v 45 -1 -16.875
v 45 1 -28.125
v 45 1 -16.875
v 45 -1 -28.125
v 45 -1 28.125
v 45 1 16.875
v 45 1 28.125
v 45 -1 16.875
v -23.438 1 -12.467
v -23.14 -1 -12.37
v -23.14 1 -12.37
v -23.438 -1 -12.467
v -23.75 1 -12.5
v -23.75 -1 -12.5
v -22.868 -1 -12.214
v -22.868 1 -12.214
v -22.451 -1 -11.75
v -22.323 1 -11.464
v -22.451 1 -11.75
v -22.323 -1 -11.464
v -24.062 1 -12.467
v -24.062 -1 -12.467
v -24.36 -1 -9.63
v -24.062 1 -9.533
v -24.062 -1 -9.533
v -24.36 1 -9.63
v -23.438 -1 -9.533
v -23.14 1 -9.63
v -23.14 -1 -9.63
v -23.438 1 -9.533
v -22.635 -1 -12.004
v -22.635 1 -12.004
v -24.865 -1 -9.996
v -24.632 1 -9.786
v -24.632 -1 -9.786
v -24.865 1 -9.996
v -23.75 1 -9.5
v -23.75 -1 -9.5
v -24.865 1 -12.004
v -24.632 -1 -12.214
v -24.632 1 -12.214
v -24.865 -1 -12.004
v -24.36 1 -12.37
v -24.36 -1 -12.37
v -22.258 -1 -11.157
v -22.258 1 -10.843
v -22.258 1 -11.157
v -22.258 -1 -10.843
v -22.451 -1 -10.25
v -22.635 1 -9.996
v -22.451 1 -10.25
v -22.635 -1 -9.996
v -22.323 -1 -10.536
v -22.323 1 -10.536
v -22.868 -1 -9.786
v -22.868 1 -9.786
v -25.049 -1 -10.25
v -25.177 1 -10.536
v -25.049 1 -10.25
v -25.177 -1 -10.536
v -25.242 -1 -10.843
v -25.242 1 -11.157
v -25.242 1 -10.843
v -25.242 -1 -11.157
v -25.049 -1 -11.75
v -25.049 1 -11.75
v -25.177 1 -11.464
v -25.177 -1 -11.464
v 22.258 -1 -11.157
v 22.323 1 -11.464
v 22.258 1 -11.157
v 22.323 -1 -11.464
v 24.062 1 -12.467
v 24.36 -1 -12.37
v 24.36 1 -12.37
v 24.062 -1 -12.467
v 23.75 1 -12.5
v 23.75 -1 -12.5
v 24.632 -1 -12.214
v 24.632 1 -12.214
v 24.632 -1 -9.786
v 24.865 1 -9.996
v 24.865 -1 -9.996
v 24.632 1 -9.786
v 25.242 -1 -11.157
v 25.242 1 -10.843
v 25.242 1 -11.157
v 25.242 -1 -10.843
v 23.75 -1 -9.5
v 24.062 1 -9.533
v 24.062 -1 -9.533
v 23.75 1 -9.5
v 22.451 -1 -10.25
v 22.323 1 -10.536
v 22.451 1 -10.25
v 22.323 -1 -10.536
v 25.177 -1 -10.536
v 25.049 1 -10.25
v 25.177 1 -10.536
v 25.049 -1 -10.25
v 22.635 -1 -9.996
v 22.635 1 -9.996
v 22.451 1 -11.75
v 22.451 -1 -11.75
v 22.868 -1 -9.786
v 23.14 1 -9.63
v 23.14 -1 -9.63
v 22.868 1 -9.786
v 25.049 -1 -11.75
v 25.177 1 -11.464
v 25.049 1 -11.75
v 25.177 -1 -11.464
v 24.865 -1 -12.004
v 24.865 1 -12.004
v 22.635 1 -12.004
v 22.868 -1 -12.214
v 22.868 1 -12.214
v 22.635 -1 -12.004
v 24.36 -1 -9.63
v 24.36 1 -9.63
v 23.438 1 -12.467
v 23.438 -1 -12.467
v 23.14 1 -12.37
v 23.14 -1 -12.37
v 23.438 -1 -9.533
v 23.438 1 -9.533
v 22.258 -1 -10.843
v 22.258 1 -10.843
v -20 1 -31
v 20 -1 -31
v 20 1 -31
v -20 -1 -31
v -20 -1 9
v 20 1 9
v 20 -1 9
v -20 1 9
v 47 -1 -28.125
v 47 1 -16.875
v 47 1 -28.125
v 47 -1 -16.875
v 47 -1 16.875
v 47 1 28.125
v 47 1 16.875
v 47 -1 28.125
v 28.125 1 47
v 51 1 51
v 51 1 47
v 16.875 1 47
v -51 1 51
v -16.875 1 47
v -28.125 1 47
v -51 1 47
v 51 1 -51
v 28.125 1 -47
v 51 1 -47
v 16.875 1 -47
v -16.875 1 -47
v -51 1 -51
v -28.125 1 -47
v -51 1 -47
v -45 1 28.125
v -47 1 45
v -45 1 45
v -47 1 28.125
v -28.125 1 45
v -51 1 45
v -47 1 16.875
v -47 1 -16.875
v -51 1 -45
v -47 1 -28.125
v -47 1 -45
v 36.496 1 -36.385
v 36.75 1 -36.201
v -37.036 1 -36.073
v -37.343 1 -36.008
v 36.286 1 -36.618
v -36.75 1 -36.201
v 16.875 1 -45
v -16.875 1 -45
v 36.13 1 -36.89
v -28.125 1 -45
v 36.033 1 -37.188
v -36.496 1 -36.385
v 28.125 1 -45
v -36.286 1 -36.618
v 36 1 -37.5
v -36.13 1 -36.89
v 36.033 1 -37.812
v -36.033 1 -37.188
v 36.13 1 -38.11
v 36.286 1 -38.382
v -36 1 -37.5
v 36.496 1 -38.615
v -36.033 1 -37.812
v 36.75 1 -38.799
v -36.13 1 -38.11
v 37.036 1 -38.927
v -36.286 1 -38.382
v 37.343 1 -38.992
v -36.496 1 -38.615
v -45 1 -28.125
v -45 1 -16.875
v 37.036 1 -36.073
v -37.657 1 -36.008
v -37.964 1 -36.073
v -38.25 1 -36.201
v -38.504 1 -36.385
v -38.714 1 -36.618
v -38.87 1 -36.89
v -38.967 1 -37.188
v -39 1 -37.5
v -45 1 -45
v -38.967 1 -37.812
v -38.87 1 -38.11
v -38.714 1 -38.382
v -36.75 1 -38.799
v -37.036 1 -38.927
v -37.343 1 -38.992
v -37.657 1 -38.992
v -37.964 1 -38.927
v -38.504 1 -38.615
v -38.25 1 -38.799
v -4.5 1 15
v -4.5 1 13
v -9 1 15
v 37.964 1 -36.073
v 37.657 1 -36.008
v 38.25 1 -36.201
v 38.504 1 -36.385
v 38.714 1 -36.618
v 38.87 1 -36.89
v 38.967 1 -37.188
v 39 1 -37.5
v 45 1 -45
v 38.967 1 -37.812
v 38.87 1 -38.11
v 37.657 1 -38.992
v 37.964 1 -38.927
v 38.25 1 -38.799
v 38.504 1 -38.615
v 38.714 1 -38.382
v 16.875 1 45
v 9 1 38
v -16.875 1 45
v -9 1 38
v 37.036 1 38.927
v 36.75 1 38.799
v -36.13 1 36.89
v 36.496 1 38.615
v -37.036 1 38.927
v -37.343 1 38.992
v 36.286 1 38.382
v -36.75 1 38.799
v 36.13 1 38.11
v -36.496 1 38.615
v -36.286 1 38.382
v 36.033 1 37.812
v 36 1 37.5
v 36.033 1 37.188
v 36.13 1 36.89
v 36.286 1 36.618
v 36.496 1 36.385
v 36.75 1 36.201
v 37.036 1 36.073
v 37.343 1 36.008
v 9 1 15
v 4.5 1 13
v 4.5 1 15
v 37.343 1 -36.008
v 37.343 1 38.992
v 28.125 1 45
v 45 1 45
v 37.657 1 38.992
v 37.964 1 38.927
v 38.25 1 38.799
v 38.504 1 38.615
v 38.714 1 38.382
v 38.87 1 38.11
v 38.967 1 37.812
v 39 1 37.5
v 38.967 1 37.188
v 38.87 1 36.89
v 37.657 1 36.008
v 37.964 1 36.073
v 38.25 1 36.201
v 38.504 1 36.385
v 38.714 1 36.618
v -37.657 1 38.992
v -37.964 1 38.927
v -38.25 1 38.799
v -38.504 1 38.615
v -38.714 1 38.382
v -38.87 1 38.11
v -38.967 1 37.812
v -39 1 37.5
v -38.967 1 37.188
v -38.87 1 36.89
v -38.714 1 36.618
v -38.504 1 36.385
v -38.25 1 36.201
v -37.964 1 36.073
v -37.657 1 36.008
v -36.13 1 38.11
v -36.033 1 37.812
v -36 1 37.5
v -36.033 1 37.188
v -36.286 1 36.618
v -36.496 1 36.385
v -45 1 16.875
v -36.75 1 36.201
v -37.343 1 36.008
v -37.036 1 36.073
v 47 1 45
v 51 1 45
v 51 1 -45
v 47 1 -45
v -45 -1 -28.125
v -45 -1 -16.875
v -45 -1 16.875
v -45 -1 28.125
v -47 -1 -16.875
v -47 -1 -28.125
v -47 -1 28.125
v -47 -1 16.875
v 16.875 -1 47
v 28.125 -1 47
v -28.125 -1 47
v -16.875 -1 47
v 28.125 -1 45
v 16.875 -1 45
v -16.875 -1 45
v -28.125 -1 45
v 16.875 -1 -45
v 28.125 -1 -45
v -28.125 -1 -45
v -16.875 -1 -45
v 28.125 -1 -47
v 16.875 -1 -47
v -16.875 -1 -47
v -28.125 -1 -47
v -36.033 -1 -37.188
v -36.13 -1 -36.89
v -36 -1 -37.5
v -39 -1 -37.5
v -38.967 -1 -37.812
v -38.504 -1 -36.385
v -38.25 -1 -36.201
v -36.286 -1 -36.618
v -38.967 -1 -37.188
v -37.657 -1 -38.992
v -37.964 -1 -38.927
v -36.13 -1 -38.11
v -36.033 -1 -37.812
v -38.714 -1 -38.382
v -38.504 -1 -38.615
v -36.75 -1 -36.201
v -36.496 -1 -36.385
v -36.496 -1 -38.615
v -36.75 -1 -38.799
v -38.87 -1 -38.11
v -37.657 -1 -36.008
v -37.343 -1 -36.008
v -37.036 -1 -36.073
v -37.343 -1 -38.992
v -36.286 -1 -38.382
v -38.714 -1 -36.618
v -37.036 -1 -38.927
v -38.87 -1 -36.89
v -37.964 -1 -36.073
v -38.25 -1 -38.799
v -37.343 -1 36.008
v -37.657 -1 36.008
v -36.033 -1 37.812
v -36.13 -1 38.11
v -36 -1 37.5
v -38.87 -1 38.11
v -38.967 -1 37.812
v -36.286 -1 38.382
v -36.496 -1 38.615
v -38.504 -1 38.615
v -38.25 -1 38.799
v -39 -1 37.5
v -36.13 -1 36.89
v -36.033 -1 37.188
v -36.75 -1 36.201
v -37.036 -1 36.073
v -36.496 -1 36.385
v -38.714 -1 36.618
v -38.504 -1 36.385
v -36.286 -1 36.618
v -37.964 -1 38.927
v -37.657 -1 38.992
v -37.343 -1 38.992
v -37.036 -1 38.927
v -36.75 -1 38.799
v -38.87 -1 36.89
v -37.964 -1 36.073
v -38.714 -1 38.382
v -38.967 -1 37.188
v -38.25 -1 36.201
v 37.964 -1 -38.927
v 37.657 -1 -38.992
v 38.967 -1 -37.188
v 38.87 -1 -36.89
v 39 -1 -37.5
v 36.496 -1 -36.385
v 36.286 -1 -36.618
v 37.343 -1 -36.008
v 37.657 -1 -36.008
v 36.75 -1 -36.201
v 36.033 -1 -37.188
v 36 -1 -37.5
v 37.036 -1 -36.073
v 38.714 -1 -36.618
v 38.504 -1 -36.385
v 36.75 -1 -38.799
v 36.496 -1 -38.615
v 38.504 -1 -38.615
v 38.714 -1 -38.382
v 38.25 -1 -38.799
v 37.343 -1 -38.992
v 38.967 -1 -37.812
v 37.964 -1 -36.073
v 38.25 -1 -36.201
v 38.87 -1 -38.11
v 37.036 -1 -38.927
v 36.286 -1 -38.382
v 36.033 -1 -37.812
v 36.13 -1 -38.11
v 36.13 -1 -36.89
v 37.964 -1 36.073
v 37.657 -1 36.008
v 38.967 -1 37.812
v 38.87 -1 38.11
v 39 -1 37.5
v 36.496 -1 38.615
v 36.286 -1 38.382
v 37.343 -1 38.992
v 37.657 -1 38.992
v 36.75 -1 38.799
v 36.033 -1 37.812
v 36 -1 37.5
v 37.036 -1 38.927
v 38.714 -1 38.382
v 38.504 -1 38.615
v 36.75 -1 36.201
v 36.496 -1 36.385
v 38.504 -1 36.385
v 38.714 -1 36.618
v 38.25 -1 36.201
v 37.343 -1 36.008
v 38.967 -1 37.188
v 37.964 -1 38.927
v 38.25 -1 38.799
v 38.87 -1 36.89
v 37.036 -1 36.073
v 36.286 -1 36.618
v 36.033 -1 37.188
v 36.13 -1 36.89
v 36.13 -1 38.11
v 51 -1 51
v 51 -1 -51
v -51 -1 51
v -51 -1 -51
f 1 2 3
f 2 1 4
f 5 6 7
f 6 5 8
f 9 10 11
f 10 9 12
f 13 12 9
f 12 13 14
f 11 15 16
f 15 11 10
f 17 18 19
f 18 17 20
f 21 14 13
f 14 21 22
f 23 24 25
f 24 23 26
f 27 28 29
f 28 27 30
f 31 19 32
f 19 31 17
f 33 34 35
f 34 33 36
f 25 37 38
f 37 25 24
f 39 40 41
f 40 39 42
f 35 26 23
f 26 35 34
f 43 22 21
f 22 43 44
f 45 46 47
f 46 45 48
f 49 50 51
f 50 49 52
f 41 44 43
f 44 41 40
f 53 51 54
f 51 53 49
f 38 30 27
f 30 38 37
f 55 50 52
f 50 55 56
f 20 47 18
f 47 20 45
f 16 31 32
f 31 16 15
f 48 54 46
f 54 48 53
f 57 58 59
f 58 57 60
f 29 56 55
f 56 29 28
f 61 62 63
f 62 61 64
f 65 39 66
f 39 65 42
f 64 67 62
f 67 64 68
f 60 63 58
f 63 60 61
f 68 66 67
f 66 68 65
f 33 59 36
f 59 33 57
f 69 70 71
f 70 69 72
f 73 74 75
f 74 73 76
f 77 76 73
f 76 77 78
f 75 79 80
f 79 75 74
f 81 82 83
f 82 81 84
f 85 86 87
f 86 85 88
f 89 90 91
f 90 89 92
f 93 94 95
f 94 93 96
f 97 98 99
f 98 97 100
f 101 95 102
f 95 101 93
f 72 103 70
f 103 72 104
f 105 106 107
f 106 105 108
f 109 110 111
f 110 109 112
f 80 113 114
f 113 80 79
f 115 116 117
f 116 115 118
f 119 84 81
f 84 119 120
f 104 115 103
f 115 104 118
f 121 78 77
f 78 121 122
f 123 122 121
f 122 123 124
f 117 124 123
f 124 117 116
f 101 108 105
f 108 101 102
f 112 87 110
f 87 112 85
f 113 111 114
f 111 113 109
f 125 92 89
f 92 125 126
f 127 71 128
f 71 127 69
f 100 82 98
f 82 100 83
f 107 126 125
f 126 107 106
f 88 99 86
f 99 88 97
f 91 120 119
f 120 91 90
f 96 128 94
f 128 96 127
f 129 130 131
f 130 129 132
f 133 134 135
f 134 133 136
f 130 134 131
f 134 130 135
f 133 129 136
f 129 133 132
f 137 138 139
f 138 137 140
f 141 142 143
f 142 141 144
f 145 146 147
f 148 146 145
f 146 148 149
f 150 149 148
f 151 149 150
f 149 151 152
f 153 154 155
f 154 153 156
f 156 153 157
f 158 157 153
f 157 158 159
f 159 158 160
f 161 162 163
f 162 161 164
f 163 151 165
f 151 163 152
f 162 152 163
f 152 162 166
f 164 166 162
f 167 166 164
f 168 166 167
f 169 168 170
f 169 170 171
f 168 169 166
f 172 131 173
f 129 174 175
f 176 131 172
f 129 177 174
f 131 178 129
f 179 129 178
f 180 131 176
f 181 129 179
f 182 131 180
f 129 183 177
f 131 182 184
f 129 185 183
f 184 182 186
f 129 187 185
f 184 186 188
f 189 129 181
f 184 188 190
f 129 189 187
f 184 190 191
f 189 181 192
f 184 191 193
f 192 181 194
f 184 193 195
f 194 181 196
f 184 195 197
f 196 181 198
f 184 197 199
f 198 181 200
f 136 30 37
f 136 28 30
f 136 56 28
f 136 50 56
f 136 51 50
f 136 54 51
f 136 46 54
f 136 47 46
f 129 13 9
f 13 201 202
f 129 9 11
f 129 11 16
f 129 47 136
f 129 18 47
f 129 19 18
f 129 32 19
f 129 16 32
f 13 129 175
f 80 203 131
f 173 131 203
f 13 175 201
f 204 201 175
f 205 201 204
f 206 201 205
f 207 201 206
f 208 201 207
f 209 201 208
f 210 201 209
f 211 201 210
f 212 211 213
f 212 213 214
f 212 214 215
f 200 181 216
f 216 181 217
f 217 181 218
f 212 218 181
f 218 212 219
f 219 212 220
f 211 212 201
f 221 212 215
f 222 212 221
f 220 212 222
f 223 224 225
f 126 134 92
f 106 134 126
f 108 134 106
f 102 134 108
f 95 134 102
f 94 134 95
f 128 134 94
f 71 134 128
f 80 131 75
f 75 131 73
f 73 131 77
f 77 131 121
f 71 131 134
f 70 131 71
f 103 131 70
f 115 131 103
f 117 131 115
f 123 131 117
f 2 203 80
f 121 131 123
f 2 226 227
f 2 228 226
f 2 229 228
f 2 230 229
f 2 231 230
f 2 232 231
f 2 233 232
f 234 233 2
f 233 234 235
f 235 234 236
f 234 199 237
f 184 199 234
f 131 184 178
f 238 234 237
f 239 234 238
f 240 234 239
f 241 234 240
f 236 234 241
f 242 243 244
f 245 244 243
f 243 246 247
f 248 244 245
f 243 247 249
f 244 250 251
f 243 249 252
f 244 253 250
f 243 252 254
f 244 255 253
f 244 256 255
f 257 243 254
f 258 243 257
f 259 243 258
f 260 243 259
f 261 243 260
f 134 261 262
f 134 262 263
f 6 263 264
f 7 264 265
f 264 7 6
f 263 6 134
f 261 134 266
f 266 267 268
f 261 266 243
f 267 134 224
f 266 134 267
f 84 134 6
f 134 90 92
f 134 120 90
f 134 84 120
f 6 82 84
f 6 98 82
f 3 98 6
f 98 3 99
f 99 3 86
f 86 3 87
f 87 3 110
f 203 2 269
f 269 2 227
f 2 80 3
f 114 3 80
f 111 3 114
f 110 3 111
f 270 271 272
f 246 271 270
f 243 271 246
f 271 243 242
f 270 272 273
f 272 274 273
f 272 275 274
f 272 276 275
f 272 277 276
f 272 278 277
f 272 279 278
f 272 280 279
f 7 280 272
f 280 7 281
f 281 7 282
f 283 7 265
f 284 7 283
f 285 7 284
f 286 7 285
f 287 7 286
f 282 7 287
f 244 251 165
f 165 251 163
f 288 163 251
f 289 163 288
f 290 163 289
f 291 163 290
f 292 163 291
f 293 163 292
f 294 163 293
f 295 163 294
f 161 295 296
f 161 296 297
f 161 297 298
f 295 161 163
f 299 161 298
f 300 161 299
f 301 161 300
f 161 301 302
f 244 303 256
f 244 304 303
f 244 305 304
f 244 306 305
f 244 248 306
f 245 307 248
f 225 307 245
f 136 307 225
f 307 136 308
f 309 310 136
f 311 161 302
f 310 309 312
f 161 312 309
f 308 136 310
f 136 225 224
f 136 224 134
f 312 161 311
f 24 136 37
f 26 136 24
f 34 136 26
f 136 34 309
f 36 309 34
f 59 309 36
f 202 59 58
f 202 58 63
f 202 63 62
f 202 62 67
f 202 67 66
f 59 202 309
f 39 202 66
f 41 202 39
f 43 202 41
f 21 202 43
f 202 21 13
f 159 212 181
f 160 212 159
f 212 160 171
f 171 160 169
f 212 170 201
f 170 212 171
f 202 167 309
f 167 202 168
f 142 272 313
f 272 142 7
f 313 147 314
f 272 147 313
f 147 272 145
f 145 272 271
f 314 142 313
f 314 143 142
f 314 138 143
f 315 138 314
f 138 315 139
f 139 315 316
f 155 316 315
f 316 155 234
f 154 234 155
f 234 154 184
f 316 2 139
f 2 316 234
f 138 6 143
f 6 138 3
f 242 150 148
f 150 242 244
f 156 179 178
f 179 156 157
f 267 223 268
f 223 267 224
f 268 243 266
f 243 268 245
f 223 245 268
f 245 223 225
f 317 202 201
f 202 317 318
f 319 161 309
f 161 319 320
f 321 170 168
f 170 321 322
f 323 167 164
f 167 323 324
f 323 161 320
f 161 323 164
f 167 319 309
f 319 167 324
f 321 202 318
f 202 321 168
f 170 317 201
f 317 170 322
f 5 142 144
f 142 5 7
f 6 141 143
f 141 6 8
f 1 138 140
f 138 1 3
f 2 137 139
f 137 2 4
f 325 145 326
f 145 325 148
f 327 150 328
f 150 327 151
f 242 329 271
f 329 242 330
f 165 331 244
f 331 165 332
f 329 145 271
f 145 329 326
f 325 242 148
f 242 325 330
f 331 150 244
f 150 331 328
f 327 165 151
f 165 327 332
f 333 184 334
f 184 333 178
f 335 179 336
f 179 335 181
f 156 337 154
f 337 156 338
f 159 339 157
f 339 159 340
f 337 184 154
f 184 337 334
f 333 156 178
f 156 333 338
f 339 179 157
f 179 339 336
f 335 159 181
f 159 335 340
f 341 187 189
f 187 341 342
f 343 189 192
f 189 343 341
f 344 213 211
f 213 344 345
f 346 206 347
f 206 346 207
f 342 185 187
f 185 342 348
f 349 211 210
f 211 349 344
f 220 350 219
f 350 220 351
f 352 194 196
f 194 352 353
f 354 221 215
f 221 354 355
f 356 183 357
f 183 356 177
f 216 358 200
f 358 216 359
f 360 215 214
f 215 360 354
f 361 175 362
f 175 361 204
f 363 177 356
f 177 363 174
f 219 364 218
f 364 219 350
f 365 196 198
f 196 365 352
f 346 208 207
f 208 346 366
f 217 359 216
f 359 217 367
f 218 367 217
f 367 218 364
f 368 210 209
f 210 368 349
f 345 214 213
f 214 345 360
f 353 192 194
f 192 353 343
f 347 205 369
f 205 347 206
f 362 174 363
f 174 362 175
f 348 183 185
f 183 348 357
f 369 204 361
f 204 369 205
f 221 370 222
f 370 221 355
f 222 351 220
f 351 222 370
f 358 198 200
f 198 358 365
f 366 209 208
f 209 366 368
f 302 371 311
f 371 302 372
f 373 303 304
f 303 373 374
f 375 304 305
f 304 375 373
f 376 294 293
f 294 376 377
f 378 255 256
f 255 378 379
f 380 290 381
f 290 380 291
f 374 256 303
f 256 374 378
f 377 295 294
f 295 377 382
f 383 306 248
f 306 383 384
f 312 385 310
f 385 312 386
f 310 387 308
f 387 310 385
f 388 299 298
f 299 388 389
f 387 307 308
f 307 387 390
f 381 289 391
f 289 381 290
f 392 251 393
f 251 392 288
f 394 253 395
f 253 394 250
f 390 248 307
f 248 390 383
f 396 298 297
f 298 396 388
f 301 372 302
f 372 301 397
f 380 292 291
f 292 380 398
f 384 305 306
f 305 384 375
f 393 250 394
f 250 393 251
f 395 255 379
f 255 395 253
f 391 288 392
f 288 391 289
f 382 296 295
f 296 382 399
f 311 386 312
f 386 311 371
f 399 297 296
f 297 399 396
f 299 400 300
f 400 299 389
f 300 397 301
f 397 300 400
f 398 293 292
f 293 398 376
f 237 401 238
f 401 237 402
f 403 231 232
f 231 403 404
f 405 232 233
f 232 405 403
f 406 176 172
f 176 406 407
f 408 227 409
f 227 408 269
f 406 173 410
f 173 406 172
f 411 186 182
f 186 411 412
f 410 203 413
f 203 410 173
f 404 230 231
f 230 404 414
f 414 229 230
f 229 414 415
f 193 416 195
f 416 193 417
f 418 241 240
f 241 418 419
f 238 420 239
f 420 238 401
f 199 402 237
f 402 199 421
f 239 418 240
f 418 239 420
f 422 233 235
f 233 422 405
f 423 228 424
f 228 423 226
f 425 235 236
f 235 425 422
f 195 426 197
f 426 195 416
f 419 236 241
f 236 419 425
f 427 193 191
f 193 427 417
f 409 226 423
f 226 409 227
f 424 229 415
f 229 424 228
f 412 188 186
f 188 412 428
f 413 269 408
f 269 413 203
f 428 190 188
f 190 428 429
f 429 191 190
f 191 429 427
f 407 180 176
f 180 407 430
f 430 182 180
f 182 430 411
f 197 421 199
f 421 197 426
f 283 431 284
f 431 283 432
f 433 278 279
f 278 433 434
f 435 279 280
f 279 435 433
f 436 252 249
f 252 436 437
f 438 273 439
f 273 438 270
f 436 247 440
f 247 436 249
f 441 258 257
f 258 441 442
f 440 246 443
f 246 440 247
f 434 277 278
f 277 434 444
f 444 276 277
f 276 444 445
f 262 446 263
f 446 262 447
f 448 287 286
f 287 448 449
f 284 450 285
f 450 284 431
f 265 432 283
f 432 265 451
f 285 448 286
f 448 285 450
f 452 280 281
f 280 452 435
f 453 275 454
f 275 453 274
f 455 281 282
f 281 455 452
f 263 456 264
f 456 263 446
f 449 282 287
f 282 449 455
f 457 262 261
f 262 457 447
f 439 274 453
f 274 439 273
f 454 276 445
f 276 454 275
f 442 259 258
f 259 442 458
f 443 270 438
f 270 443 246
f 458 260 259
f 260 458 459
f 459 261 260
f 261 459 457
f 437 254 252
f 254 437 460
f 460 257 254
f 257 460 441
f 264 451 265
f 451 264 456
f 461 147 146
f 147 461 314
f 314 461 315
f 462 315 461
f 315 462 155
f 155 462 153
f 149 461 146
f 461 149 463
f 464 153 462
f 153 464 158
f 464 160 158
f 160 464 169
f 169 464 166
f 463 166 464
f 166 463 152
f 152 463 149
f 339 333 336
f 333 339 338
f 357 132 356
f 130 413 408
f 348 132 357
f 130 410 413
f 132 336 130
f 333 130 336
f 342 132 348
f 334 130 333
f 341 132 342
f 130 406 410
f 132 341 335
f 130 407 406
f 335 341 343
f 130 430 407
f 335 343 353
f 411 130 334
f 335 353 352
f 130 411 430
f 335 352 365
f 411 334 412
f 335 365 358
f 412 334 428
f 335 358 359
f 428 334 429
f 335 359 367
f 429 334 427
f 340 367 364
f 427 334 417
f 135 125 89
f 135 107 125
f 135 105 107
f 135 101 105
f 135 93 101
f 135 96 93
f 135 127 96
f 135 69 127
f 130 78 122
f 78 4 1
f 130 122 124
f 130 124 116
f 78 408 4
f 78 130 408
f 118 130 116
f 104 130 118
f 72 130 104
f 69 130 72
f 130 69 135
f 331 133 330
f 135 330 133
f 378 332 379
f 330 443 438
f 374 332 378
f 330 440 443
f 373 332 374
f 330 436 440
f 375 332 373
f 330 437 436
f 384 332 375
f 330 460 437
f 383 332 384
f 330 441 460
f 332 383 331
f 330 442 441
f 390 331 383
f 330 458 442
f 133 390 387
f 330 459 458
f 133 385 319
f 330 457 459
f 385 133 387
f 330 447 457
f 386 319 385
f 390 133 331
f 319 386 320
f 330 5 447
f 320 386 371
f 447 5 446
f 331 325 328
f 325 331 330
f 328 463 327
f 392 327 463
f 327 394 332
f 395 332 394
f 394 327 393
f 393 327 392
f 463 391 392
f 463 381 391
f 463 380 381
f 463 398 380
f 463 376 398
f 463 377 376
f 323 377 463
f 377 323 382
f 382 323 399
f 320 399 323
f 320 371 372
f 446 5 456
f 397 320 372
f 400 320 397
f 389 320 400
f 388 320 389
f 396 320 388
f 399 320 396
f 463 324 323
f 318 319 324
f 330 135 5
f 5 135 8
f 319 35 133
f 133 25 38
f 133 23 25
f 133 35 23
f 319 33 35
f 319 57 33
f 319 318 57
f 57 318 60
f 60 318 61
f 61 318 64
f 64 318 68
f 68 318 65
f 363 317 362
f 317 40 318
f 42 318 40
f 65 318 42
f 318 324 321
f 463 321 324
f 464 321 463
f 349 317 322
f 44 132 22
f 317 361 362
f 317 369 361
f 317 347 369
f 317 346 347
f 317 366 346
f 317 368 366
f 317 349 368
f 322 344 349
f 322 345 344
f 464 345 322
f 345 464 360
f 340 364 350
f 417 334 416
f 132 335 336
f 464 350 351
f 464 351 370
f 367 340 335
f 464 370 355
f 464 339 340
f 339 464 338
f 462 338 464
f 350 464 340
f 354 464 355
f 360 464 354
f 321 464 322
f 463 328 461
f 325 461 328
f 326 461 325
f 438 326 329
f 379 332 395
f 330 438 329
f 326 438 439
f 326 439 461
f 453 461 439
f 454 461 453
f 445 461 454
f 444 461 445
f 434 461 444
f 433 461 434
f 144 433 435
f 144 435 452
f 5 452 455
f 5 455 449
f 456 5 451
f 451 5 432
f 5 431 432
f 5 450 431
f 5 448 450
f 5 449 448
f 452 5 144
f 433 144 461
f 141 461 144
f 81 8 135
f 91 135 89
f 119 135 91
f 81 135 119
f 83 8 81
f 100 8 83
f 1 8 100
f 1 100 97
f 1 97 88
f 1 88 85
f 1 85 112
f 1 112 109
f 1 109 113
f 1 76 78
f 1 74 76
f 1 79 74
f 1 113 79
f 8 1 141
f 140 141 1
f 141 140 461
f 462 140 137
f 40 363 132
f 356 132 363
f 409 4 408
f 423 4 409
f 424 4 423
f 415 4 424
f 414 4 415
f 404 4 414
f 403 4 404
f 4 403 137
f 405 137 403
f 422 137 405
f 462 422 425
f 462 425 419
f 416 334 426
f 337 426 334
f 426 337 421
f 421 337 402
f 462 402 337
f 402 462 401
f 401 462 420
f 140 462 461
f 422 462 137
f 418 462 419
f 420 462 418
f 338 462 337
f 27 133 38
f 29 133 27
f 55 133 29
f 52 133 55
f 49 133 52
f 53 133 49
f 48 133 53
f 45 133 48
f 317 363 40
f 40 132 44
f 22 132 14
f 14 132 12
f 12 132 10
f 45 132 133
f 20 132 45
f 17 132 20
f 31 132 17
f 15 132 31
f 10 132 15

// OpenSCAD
// file: boxit.scad
/** Generic snap-together enclosure creator */

I_WALL_LEFT = 0;
I_WALL_RIGHT = 1;
I_WALL_BOTTOM = 2;
I_WALL_TOP = 3;
I_WALL_BACK = 4;
I_WALL_FRONT = 5;

WALL_TH = 2;

HOLE_OR = 3 / 2;

/*
wall_th - wall thickness
inside_dims - [length, width, height]
*/
module boxit(inside_dims, wall_th=WALL_TH, ofscale=1.0) {
    ofs = boxit_wall_offsets(inside_dims, wall_th);
    
    translate(ofs[I_WALL_LEFT] * ofscale) 
        boxit_wall_left(inside_dims, wall_th) {
            children(0);
            children(1);
        }
    translate(ofs[I_WALL_RIGHT] * ofscale) 
        boxit_wall_right(inside_dims, wall_th) {
            children(0);
            children(1);
        }
    translate(ofs[I_WALL_BOTTOM] * ofscale) 
        boxit_wall_bottom(inside_dims, wall_th) {
            children(0);
            children(1);
        }
    translate(ofs[I_WALL_TOP] * ofscale) 
        boxit_wall_top(inside_dims, wall_th) {
            children(0);
            children(1);
        }
    translate(ofs[I_WALL_BACK] * ofscale) 
        boxit_wall_back(inside_dims, wall_th) {
            children(0);
            children(1);
        }
    translate(ofs[I_WALL_FRONT] * ofscale) 
        boxit_wall_front(inside_dims, wall_th) {
            children(0);
            children(1);
        }
}
    
module boxit_wall_left(inside_dims, wall_th) {
    boxit_wall(inside_dims, wall_th, I_WALL_LEFT) {
        //intersection() {
            children(0);
        //    rotate([0, -90, 0])
         //       wall_mask(inside_dims[2], inside_dims[1], inside_dims[0]/2);
         //   }
        children(1);
    }
}

module boxit_wall_right(inside_dims, wall_th) {       
    boxit_wall(inside_dims, wall_th, I_WALL_RIGHT) {
        //intersection() {
            children(0);
        //    rotate([0, 90, 0])
        //        wall_mask(inside_dims[2], inside_dims[1], inside_dims[0]/2);
        //}
        children(1);
    }
}

module boxit_wall_bottom(inside_dims, wall_th) {        
    boxit_base(inside_dims, wall_th, I_WALL_BOTTOM) {
         //   intersection() {
                children(0);
        //        rotate([0, 180, 0])
        //            wall_mask(inside_dims[0], inside_dims[1], inside_dims[2]/2);
         //   }
            children(1);
        }
    }
    
module boxit_wall_top(inside_dims, wall_th) {        
    boxit_base(inside_dims, wall_th, I_WALL_TOP) {
        //intersection() {
            children(0);
        //    wall_mask(inside_dims[0], inside_dims[1], inside_dims[2]/2);
        //}
        children(1);
    }
}

module boxit_wall_back(inside_dims, wall_th) {        
    boxit_cap(inside_dims, wall_th, I_WALL_BACK) {
        //intersection() {
            children(0);
         //   rotate([90, 0, 0])
        //        wall_mask(inside_dims[0], inside_dims[2], inside_dims[1]/2);
        //}
        children(1);
    }
}

module boxit_wall_front(inside_dims, wall_th) {        
    boxit_cap(inside_dims, wall_th, I_WALL_FRONT) {
       //intersection() {
            children([0]);
       //     rotate([-90, 0, 0])
      //          wall_mask(inside_dims[0], inside_dims[2], inside_dims[1]/2);
      // }
       children(1);
    }
}

function boxit_wall_offsets(inside_dims, wall_th) = [
    // left, right, bottom, top, back, front
    [-inside_dims[0]/2 - wall_th/2, 0, 0],
    [inside_dims[0]/2 + wall_th/2, 0, 0],
    [0, 0, -inside_dims[2]/2 - wall_th/2],
    [0, 0, inside_dims[2]/2 + wall_th/2],
    [0, -inside_dims[1]/2 - wall_th/2, 0],
    [0, inside_dims[1]/2 + wall_th/2, 0],
];

module wall_mask(l, w, h) {
    linear_extrude(height=h*2, scale=h*2)
        square([l/h, w/h], center=true);
}

module boxit_wall(inside_dims, wall_th, offs_index) {
    ofs = boxit_wall_offsets(inside_dims, wall_th);
    difference() {
        union() {
            cube([wall_th, inside_dims[1], inside_dims[2]], center=true);
            translate([0, inside_dims[1] / 4, 0])
                cube([wall_th, inside_dims[1] / 8, inside_dims[2] + 4 * wall_th], center=true);
           translate([0, -inside_dims[1] / 4, 0])
                cube([wall_th, inside_dims[1] / 8, inside_dims[2] + 4 * wall_th], center=true);
            translate([0, 0, inside_dims[2] / 4])
                cube([wall_th, inside_dims[1] + 4 * wall_th, inside_dims[2] / 8], center=true);
            translate([0, 0, -inside_dims[2] / 4])
                cube([wall_th, inside_dims[1] + 4 * wall_th, inside_dims[2] / 8], center=true);
           translate(-1 * ofs[offs_index])
                children(0);
        }
        translate(-1 * ofs[offs_index])
            children(1);
    }
}

module boxit_base(inside_dims, wall_th, offs_index) {
    ofs = boxit_wall_offsets(inside_dims, wall_th);
    difference() {
        union() {
            cube([inside_dims[0] + 6 * wall_th, inside_dims[1], wall_th], center=true);
            
            translate([inside_dims[0] / 4, 0, 0])
                cube([inside_dims[0] / 8, inside_dims[1] + 4 * wall_th, wall_th], center=true);
            translate([-inside_dims[0] / 4, 0, 0])
                cube([inside_dims[0] / 8, inside_dims[1] + 4 * wall_th, wall_th], center=true);
       
            translate(-1 * ofs[offs_index])
                children(0);
        }
        translate(-1 * ofs[offs_index] + ofs[I_WALL_LEFT])
            boxit_wall(inside_dims, wall_th, I_WALL_LEFT) {
                cube(0); //children(0);
                cube(0); //children(1);
            }
        translate(-1 * ofs[offs_index] + ofs[I_WALL_RIGHT])
            boxit_wall(inside_dims, wall_th, I_WALL_RIGHT) {
                cube(0); //children(0);
                cube(0); //children(1);
            }
        translate(-1 * ofs[offs_index])
            children(1);
    }
}

module boxit_cap(inside_dims, wall_th, offs_index) {
    ofs = boxit_wall_offsets(inside_dims, wall_th);
    difference() {
        union() {
            translate(-1 * ofs[offs_index]) {
                children([0]);
            }
            cube([inside_dims[0] + 6 * wall_th, wall_th, inside_dims[2] + 6 * wall_th], center=true);
            
        }
        
        translate(-1 * ofs[offs_index]) {
            children(1); 
            translate(ofs[I_WALL_LEFT])
                boxit_wall(inside_dims, wall_th, I_WALL_LEFT) {
                    cube(0); //children(0);
                    cube(0);
                }
            translate(ofs[I_WALL_RIGHT])
                boxit_wall(inside_dims, wall_th, I_WALL_RIGHT) {
                    cube(0); //children(0);
                    cube(0);
                }
            translate(ofs[I_WALL_TOP])
                boxit_base(inside_dims, wall_th, I_WALL_TOP) {
                    cube(0); //children(0);
                    cube(0);
                }
            translate(ofs[I_WALL_BOTTOM])
                boxit_base(inside_dims, wall_th, I_WALL_BOTTOM) {
                    cube(0); //children(0);
                    cube(0);
                }
            
            # through_holes(inside_dims, wall_th);
        }
    }
}

module through_holes(inside_dims, wall_th) {
    for (x=[-1,1]) {
        for (z=[-1,1]) {
            translate([x * (inside_dims[0] / 2 - 3 * wall_th - HOLE_OR), 0, z * (inside_dims[2] / 2 - 3 * wall_th - HOLE_OR)]) {
                rotate([90, 0, 0]) {
                    cylinder(r=HOLE_OR, h=1.5 * inside_dims[1], center=true);
            }
            }
        }
    }
}

module boxit_demo(inside_dims, wall_th, ofscale=5.0) {
    boxit(inside_dims, wall_th) {
        children(0);
        children(1);
    }
    % boxit(inside_dims, wall_th, ofscale=ofscale) {
        children(0);
        children(1);
    }
}


module demo_contents() {
    sphere(r=45);
}

module demo_anticontents() {
    rotate([45, 45, 90])
        cube(60, center=true);
}
* demo_contents();
* demo_anticontents();
wall_th = 8 * 0.2;
inside_dims = [100, 50, 75];
boxit_demo(inside_dims, wall_th) {
     demo_contents();
    demo_anticontents();
   
} 
* boxit_wall_front(inside_dims, wall_th) {
     demo_contents();
    # demo_anticontents();
   
}
// main file
use <boxit.scad>

// CONSTANTS
$fn = 30;
wall_th = 2.0;
inside_dims = [90, 90, 90];
eparts_offset = [-10, 8, 04];

// MEASUREMENTS
ssr_w = 58;
ssr_h = 45;
ssr_d = 30;
ssr_screw_c_c = 47.5;

spool_od = 200;
spool_h = 80;
spool_id = 50;
spool_oid = 95;
spool_rim_h = 4;

filament_od = 1.75;

pidbox_h = 45;
pidbox_w = 45;
pidbox_d = 85;
pidbox_face_d = 6;
pidbox_hole_od = 3;

outlet_screw_c_c = 84;
outlet_w = 34;
outlet_h = 68;
outlet_center = 9;
outlet_screw_od = 3;
outlet_face_d = 5;
outlet_d = 18;

heater_grate_w = 220;
heater_grate_h = 43;

face_d = min(outlet_face_d, pidbox_face_d);

plug_h = (outlet_h - outlet_center) / 2;
module plug_face() {
    intersection() {
        cube([plug_h, outlet_w, outlet_face_d]);
        translate([plug_h / 2, outlet_w / 2, 0])
            cylinder(h=face_d, r=outlet_w / 2);
    }
}

module outlet() {
    translate([outlet_center / 2, -outlet_w / 2, 0])
        plug_face();
    translate([-outlet_center / 2 - plug_h, -outlet_w / 2, 0])
        plug_face();
    translate([-outlet_h/2, -outlet_w/2, -outlet_d])
        cube([outlet_h, outlet_w, outlet_d]);
    # cylinder(r=outlet_screw_od/2, h=face_d);
    # translate([outlet_screw_c_c / 2, 0, 0])
        cylinder(h=face_d, r=outlet_screw_od/2);
    # translate([-outlet_screw_c_c / 2, 0, 0])
        cylinder(h=face_d, r=outlet_screw_od/2);
}

module ssr() {
    difference() {
        translate([-ssr_h/2, -ssr_w/2])
            cube([ssr_h, ssr_w, ssr_d]);
        translate([0, -ssr_screw_c_c / 2, 0])
            cylinder(r=outlet_screw_od/2, h=ssr_d);
        translate([0, ssr_screw_c_c / 2,  0])
            cylinder(r=outlet_screw_od/2, h=ssr_d);
    }
    # translate([0, -ssr_screw_c_c / 2, ssr_d/2])
        cylinder(r=outlet_screw_od/2, h=2*ssr_d, center=true);
    # translate([0, ssr_screw_c_c / 2,  ssr_d/2])
        cylinder(r=outlet_screw_od/2, h=2*ssr_d, center=true);
    translate([-20, -20, -wall_th*2])
        cube([40, 40, wall_th*4]);
        
}

module pidbox() {
    cube([pidbox_h, pidbox_w, pidbox_d], center=true);
    translate([0, 0, pidbox_d / 2 + pidbox_face_d / 2])
        cube([pidbox_h + 5, pidbox_w + 5, pidbox_face_d], center=true); 
}

module pidbox_holes(width=pidbox_h + 20, height=pidbox_h + 20) {
    ofs_x = 2.3;
    ofs_y = 4.5;
    translate([-pidbox_h / 2, -pidbox_w / 2, 0])
        cube([pidbox_h, pidbox_w, face_d]);
    translate([-pidbox_h/2 + ofs_x, -pidbox_w/2 - ofs_y, pidbox_d / 2])
        cylinder(h=2 * face_d, r=pidbox_hole_od/2, center=true);
    translate([pidbox_h/2 - ofs_x, pidbox_w/2 + ofs_y, pidbox_d / 2])
        cylinder(h=2 * face_d, r=pidbox_hole_od/2, center=true);
    
    translate([pidbox_h/2 - ofs_x, -pidbox_w/2 - ofs_y, pidbox_d / 2])
        cylinder(h=2 * face_d, r=pidbox_hole_od/2, center=true);
    translate([-pidbox_h/2 + ofs_x, pidbox_w/2 + ofs_y, pidbox_d / 2])
        cylinder(h=2 * face_d, r=pidbox_hole_od/2, center=true);
    
    translate([-pidbox_h/2 - ofs_y, -pidbox_w/2 + ofs_x, pidbox_d / 2])
        cylinder(h=2 * face_d, r=pidbox_hole_od/2, center=true);
    translate([pidbox_h/2 + ofs_y, pidbox_w/2 - ofs_x, pidbox_d / 2])
        cylinder(h=2 * face_d, r=pidbox_hole_od/2, center=true);
    
    translate([pidbox_h/2 + ofs_y, -pidbox_w/2 + ofs_x, pidbox_d / 2])
        cylinder(h=2 * face_d, r=pidbox_hole_od/2, center=true);
    translate([-pidbox_h/2 - ofs_y, pidbox_w/2 - ofs_x, pidbox_d / 2])
        cylinder(h=2 * face_d, r=pidbox_hole_od/2, center=true);
}

module pidbox_in_place(inside_dims, wall_th) { 
    translate([-5, 5, 0]) {
        rotate([0, 0, 0]) {
            pidbox_holes();
            # pidbox();
        }
    }
}
       
module outlet_in_place(inside_dims, wall_th) {
    translate([55, -15, -10]) {
        rotate([45, 0, 0]) { 
            rotate([0, 90, 0]) {  
                # outlet();
            }
        }
    }
}
            
module ssr_in_place(inside_dims, wall_th) {
    translate([10, -56, -15]) {
        rotate([90, 90, 0]) {
            # ssr();
        }   
    }
}

module tplug_in_place(inside_dims, wall_th, include_plug=true, include_holder=true) {
    # translate([0, -40, 38]) {
        rotate([0, -90, 90]) {
            if (include_holder)
                tplug_holder(inside_dims, wall_th, plug);
            if (include_plug)
                thermal_plug(true);
        }
    }
}

tplug_l = 23;
tplug_w = 18;
tplug_h = 10;
tine_l = 11;
tine_w = 3;
tine_h = 1.8;
tine_inside = 5.15;
tine_outside = 10.5;

module thermal_plug() {
    translate([tine_l / 2, tine_inside/2 + tine_w/2, 0])
        cube([tine_l, tine_w, tine_h], center=true);
    translate([tine_l / 2, -tine_inside/2 - tine_w/2, 0])
        cube([tine_l, tine_w, tine_h], center=true);
    translate([-tplug_l / 2, 0, 0])
        cube([tplug_l, tplug_w, tplug_h], center=true);
    translate([-tplug_l - wall_th / 2, 0, 0])
        cube([wall_th, tplug_w/2, tplug_h], center=true);
}

module tplug_holder(inside_dims, wall_th, include_plug=true) {
    difference() {
        translate([-tplug_l - wall_th, -tplug_w / 2 - wall_th, -tplug_h/2 - wall_th])
            cube([tplug_l + tine_l, tplug_w + 2 * wall_th , tplug_h + wall_th ]);
        thermal_plug();
    }
    if (include_plug)
        thermal_plug();
}

iec_l = 27;
iec_w = 19;
iec_h = 15;
iec_connector_h = 25;
iec_flange_l = 50;
iec_flange_w = 22;
iec_flange_h = 6;
iec_hole_c_c = 40;
iec_hole_or = 2;

module iec_plug() {
    difference() {
        union() {
            translate([0, 0, -iec_h / 2 ])
                cube([iec_l, iec_w, iec_h], center=true);
            % translate([0, 0, -iec_h - iec_connector_h / 2])
                cube([iec_l, iec_w, iec_connector_h], center=true);
            translate([0, 0, iec_flange_h / 2])
                cube([iec_flange_l, iec_flange_w, iec_flange_h], center=true);
        }
        translate([iec_hole_c_c/2, 0, 0])
            cylinder(r=iec_hole_or, h=iec_h, center=true);
        translate([-iec_hole_c_c/2, 0, 0])
            cylinder(r=iec_hole_or, h=iec_h, center=true);
        
    }
    translate([iec_hole_c_c/2, 0, 0])
        cylinder(r=iec_hole_or, h=iec_h, center=true);
    translate([-iec_hole_c_c/2, 0, 0])
        cylinder(r=iec_hole_or, h=iec_h, center=true);
    translate([0, 0, iec_h])
    cube([iec_l - 2, iec_w - 2, iec_h * 2], center=true);
}

module iec_plug_in_place(inside_dims, wall_th) {
    # translate([57, 10, 15]) {
            rotate([45, 0, 0])
            rotate([0, 90, 0]) {
                
                iec_plug();     
            }
    }
}

module eparts(inside_dims=inside_dims, wall_th=wall_th) {
    translate(eparts_offset) {
        pidbox_in_place(inside_dims, wall_th);
        outlet_in_place(inside_dims, wall_th);
        ssr_in_place(inside_dims, wall_th);
        
        # iec_plug_in_place(inside_dims, wall_th);
    }
    tplug_in_place(inside_dims, wall_th, include_plug=true, include_holder=false);
    save_plastic(inside_dims, wall_th);
}

//eparts(inside_dims, wall_th);

module save_plastic(inside_dims, wall_th) {
    rocker_or = 10;
    * translate([0, 0, inside_dims[2] / 2 - 1])
        linear_extrude(height=wall_th*2)
        offset(r=rocker_or/2)
        square([inside_dims[0] * 2/3, inside_dims[1] * 2/3], center=true);
    
    translate([0, 0, -inside_dims[2] / 2 - wall_th - 1])
        linear_extrude(height=wall_th*2)
        offset(r=rocker_or/2)
        square([inside_dims[0] * 2/3, inside_dims[1] * 2/3], center=true);
    
    translate([-inside_dims[0]/2 - wall_th - 1, 0, 0])
        rotate([0, 90, 0])
        linear_extrude(height=wall_th*2)
        offset(r=rocker_or/2)
        square([inside_dims[2] * 2/3, inside_dims[1] * 2/3], center=true);
    
    translate([0, inside_dims[1] / 2 + wall_th + 1, 0])
        rotate([90, 0, 0])
        linear_extrude(height=wall_th*2)
        offset(r=rocker_or/2)
        square([inside_dims[0] * 2/3, inside_dims[2] * 2/3], center=true);
        
    * translate([0, -inside_dims[1] / 2 - wall_th - 1, 0])
        rotate([-90, 0, 0])
        linear_extrude(height=wall_th*2)
        offset(r=rocker_or/2)
        square([inside_dims[0] * 2/3, inside_dims[2] * 2/3], center=true);
}

module wall_adds(inside_dims, wall_th) {
    tplug_in_place(inside_dims, wall_th, include_plug=false, include_holder=true);
}

 * boxit(inside_dims, wall_th, ofscale=1) {
    wall_adds(inside_dims, wall_th);
    # eparts(inside_dims, wall_th);
}

* boxit(inside_dims, wall_th, ofscale=5) {
    wall_adds(inside_dims, wall_th);
    //cube(0);
    # eparts(inside_dims, wall_th);
}

module export(face_i) {
    if (face_i == 0)
        translate([inside_dims[0]/2 + wall_th/2, 0, 0])
     boxit_wall_right(inside_dims, wall_th) {
        cube(0);
        eparts(inside_dims, wall_th);
    }
    if (face_i == 1)
        boxit_wall_left(inside_dims, wall_th) {
        cube(0);
        eparts(inside_dims, wall_th);
    }
    
    if (face_i == 2)
        boxit_wall_top(inside_dims, wall_th) {
        wall_adds(inside_dims, wall_th);
        eparts(inside_dims, wall_th);
    }

    if (face_i == 3)
        boxit_wall_bottom(inside_dims, wall_th) {
        cube(0); //wall_mods(inside_dims, wall_th);
        eparts(inside_dims, wall_th);
    }
    //* wall_mods();
    if (face_i == 4)
        translate([0, inside_dims[1]/2 + wall_th / 2, 0])
    boxit_wall_front(inside_dims, wall_th) {
        cube(0);
        # eparts(inside_dims, wall_th);
    }
    if (face_i == 5)
        boxit_wall_back(inside_dims, wall_th) {
        cube(0);
        eparts(inside_dims, wall_th);
    }
}

export(5);
